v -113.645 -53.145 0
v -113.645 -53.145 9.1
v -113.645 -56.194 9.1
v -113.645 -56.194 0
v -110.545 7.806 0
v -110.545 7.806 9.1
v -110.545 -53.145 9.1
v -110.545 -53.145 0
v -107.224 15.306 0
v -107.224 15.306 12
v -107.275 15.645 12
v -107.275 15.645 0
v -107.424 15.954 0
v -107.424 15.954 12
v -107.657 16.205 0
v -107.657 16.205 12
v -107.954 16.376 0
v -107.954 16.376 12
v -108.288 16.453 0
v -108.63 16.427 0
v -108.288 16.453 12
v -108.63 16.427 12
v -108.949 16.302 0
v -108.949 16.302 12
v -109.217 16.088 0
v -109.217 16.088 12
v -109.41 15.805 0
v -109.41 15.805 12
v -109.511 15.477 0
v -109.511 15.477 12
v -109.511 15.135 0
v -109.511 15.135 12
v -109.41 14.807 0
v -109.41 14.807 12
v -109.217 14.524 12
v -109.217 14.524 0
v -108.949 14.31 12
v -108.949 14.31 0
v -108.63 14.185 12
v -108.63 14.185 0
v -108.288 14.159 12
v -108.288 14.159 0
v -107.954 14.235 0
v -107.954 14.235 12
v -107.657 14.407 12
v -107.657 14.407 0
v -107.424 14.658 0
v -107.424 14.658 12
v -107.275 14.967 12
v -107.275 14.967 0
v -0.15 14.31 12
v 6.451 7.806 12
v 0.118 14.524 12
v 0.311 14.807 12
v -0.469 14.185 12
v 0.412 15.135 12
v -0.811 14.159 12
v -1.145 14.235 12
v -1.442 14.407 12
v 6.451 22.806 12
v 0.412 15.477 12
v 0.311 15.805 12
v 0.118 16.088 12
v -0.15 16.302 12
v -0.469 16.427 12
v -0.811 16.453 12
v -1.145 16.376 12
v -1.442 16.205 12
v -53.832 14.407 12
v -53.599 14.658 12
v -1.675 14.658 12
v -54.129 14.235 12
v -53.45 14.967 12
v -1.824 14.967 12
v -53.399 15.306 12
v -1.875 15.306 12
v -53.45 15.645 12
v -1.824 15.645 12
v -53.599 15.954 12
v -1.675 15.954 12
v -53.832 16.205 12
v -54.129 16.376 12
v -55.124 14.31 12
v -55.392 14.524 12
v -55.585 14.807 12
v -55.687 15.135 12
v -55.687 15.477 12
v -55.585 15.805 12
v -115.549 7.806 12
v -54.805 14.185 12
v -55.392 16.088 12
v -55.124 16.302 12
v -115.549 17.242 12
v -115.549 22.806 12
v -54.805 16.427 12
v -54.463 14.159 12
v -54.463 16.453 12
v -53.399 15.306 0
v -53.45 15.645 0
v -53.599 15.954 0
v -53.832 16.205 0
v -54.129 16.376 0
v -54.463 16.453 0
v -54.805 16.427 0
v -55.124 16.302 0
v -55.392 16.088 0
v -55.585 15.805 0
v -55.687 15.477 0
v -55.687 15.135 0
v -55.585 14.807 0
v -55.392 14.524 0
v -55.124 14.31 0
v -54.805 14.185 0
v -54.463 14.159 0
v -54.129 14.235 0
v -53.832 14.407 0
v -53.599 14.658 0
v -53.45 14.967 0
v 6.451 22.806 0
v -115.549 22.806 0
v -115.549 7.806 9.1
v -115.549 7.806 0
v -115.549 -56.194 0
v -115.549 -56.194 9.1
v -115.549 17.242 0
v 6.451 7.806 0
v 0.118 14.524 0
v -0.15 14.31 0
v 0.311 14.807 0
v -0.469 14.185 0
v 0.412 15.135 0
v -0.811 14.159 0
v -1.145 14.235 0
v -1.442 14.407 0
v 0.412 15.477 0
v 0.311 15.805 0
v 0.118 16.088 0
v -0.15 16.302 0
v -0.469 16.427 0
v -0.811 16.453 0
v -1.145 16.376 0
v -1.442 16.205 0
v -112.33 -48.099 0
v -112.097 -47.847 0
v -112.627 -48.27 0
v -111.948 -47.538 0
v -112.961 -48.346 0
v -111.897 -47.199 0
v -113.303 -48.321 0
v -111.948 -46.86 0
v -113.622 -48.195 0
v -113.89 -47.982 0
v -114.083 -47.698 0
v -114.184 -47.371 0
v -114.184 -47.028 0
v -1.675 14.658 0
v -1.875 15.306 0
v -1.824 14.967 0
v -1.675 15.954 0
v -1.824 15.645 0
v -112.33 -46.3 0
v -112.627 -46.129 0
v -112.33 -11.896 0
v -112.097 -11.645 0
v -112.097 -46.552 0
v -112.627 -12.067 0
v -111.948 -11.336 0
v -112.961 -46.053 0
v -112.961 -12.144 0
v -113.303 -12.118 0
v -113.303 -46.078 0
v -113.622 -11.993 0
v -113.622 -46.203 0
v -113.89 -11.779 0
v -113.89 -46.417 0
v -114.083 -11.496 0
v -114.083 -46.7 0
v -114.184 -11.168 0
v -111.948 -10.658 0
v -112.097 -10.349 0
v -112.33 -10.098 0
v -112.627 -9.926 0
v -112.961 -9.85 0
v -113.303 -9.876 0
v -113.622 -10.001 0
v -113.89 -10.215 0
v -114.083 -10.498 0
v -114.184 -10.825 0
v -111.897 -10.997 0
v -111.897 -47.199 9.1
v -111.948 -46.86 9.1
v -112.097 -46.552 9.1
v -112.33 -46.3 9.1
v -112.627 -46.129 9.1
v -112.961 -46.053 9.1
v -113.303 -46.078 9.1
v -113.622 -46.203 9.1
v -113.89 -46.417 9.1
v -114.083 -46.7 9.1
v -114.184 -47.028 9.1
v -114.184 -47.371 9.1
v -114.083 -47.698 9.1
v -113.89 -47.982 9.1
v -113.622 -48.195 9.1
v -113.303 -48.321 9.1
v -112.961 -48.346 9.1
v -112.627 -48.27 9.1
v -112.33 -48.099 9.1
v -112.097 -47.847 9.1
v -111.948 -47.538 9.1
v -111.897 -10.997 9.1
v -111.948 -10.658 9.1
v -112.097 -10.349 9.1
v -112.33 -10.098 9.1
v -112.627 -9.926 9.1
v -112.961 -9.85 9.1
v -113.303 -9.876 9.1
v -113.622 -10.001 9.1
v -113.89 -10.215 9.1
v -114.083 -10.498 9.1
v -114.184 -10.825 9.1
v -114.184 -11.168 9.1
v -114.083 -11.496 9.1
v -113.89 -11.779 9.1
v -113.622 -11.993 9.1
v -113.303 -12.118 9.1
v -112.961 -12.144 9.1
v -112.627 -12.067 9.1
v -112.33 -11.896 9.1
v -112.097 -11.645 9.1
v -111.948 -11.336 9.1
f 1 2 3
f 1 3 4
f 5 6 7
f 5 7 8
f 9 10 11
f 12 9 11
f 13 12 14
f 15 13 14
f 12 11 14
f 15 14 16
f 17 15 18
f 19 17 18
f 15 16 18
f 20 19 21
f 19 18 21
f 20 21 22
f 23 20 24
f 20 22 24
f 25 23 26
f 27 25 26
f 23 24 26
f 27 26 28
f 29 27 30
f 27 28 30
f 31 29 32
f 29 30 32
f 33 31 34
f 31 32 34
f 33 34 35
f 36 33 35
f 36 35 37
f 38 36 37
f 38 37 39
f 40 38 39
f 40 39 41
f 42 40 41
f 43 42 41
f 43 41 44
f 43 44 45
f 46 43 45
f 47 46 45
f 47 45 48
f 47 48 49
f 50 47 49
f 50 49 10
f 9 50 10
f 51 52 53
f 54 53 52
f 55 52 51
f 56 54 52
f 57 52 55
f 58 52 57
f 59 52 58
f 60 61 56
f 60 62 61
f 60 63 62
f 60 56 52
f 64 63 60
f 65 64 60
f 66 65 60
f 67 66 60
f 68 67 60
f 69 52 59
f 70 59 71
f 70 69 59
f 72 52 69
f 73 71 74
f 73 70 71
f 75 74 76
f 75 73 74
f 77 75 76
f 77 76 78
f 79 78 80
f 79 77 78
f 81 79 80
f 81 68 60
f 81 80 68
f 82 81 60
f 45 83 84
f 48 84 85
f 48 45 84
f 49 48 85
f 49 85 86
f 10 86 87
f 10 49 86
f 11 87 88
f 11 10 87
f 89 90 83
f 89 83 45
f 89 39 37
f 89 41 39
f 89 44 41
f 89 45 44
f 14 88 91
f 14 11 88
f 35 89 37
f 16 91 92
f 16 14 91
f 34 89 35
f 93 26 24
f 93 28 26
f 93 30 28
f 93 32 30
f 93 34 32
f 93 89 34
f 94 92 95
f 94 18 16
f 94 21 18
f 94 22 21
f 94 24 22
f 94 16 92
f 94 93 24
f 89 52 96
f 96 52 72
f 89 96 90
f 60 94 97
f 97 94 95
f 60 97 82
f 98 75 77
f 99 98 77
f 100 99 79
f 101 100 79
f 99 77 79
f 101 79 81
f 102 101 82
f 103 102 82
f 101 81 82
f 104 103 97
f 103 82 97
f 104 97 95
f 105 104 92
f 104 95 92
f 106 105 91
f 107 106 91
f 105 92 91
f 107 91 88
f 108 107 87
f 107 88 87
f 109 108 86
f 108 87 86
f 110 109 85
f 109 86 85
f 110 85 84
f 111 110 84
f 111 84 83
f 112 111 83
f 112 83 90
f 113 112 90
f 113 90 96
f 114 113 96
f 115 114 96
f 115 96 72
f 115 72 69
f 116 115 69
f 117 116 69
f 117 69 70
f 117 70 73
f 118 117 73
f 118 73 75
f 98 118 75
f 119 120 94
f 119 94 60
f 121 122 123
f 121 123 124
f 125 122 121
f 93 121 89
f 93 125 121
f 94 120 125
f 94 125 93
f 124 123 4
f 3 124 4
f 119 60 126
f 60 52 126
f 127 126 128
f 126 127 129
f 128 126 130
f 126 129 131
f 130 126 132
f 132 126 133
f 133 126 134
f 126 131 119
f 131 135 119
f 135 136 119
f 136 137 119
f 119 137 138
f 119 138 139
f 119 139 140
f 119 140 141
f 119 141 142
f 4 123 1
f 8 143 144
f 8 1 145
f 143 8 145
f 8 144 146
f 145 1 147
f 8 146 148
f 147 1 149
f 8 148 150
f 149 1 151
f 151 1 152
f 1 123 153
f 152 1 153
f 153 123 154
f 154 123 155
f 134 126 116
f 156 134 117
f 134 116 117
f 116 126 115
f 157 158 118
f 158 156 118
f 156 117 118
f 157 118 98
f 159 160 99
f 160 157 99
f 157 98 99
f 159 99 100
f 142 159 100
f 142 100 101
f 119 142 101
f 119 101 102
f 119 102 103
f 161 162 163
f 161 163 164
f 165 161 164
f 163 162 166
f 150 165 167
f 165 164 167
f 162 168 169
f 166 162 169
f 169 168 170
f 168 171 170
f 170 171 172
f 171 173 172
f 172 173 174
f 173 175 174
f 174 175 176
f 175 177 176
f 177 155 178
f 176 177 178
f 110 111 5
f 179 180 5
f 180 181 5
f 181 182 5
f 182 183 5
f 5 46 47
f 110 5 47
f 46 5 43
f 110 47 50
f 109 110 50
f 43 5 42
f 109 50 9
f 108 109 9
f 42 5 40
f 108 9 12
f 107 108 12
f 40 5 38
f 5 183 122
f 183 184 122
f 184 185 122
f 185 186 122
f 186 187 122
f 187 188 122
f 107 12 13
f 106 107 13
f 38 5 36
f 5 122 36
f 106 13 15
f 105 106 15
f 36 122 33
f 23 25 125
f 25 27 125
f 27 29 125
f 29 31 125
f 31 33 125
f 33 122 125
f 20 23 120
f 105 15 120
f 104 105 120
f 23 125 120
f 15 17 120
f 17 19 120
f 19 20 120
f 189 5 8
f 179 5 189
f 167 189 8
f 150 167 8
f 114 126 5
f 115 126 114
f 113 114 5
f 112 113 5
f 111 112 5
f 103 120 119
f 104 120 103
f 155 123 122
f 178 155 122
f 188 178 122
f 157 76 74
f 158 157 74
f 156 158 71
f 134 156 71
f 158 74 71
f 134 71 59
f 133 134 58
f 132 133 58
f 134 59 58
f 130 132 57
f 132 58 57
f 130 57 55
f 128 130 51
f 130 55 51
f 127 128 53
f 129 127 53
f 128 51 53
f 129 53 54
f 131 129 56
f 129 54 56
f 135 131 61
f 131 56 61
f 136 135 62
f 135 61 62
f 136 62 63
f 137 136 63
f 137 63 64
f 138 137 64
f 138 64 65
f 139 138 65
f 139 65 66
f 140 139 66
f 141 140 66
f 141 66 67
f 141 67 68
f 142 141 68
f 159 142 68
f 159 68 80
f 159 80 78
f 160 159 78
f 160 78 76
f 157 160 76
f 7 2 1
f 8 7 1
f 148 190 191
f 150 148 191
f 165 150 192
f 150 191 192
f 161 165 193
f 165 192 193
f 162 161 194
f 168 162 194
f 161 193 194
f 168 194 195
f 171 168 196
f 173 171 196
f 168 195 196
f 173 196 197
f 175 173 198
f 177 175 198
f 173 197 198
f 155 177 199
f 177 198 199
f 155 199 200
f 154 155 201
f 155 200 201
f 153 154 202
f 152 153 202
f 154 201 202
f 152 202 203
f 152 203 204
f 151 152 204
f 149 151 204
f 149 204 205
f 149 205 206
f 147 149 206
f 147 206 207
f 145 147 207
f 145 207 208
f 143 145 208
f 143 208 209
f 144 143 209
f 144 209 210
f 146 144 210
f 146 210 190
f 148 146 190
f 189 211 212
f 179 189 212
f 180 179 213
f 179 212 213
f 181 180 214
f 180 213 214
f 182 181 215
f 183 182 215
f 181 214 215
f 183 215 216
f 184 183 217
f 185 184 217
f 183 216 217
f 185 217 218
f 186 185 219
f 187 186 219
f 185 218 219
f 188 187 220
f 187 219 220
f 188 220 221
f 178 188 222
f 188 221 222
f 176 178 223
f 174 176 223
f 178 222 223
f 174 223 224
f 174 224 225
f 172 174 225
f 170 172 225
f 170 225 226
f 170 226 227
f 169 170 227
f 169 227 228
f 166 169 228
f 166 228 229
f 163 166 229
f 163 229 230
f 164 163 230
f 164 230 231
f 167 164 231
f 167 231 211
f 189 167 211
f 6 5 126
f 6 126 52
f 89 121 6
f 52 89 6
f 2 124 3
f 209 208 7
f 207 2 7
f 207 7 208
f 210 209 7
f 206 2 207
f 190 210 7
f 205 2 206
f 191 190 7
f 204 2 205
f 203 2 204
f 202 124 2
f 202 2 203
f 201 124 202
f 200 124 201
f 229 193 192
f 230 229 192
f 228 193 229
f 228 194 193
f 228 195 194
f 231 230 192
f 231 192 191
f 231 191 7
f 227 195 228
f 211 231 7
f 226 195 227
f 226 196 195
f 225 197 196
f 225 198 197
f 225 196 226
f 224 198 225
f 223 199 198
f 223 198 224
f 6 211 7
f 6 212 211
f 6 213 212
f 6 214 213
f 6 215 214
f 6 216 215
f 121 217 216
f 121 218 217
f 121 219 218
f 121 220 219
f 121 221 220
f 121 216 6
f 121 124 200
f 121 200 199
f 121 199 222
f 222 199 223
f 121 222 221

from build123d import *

# Parameters (mm, degrees)
SZKIC1_W                    = 48.766356044
SZKIC1_H                    = 9.435580599
DODANIE_WYCI_GNI_CIE1_DEPTH = 10
SZKIC2_W                    = 48.766356044
SZKIC2_H                    = 9.435580599
DODANIE_WYCI_GNI_CIE2_DEPTH = 2
SZKIC5_W                    = 12
SZKIC5_H                    = 9.435580599
DODANIE_WYCI_GNI_CIE3_DEPTH = 73.233643957
SZKIC6_W                    = 122
SZKIC6_H                    = 12
DODANIE_WYCI_GNI_CIE4_DEPTH = 5.564419
SZKIC7_W                    = 3.404574644
SZKIC7_H                    = 12
DODANIE_WYCI_GNI_CIE5_DEPTH = 64
SZKIC8_W                    = 12
SZKIC8_H                    = 3.048992282
WYTNIJ_WYCI_GNI_CIE1_DEPTH  = 1.5
SZKIC9_R                    = 1.15
WYTNIJ_WYCI_GNI_CIE2_DEPTH  = 130.048184814
SZKIC10_W                   = 12
SZKIC10_H                   = 60.951007718
DODANIE_WYCI_GNI_CIE6_DEPTH = 1.6
SZKIC11_R                   = 1.15
WYTNIJ_WYCI_GNI_CIE3_DEPTH  = 130.048184814
WYTNIJ_WYCI_GNI_CIE4_REACH  = 136.855
SZKIC12_W                   = 2.9
SZKIC12_H                   = 64


with BuildPart() as part:
    # Szkic1 → Dodanie-wyciągnięcie1 (new body)
    with BuildSketch(Plane.XY):
        with Locations((-17.932561551, 12.523716149)):
            Rectangle(SZKIC1_W, SZKIC1_H)
    extrude(amount=DODANIE_WYCI_GNI_CIE1_DEPTH)

    # Szkic2 → Dodanie-wyciągnięcie2 (add)
    with BuildSketch(Plane.XY.offset(10)):
        with Locations((-17.932561551, 12.523716149)):
            Rectangle(SZKIC2_W, SZKIC2_H)
    extrude(amount=DODANIE_WYCI_GNI_CIE2_DEPTH)

    # Szkic5 → Dodanie-wyciągnięcie3 (add)
    with BuildSketch(Plane.ZY.offset(42.315739573)):
        with Locations((6, 12.523716149)):
            Rectangle(SZKIC5_W, SZKIC5_H)
    extrude(amount=DODANIE_WYCI_GNI_CIE3_DEPTH)

    # Szkic6 → Dodanie-wyciągnięcie4 (add)
    with BuildSketch(Plane(origin=(0, 17.241506448, 0), x_dir=(1, 0, 0), z_dir=(0, 1, 0))):
        with Locations((-54.549383529, -6)):
            Rectangle(SZKIC6_W, SZKIC6_H)
    extrude(amount=DODANIE_WYCI_GNI_CIE4_DEPTH)

    # Szkic7 → Dodanie-wyciągnięcie5 (add)
    with BuildSketch(Plane.XZ.offset(-7.805925849)):
        with Locations((-113.847096207, 6)):
            Rectangle(SZKIC7_W, SZKIC7_H)
    extrude(amount=DODANIE_WYCI_GNI_CIE5_DEPTH)

    # Szkic8 → Wytnij-wyciągnięcie1 (cut)
    with BuildSketch(Plane(origin=(-112.144808885, 0, 0), x_dir=(0, 0, -1), z_dir=(1, 0, 0))):
        with Locations((-6, -54.66957801)):
            Rectangle(SZKIC8_W, SZKIC8_H)
    extrude(amount=-WYTNIJ_WYCI_GNI_CIE1_DEPTH, mode=Mode.SUBTRACT)

    # Szkic9 → Wytnij-wyciągnięcie2 (cut, through all)
    with BuildSketch(Plane.XY.offset(12)):
        with Locations((-54.549383529, 15.305925849)):
            Circle(SZKIC9_R)
        with Locations((-108.373957188, 15.305925849)):
            Circle(SZKIC9_R)
        with Locations(Location((-0.724809871, 15.305925849, 0), (0, 0, 180))):
            Circle(SZKIC9_R)
    extrude(amount=-WYTNIJ_WYCI_GNI_CIE2_DEPTH, mode=Mode.SUBTRACT)

    # Szkic10 → Dodanie-wyciągnięcie6 (add)
    with BuildSketch(Plane(origin=(-112.144808885, 0, 0), x_dir=(0, 0, -1), z_dir=(1, 0, 0))):
        with Locations((-6, -22.66957801)):
            Rectangle(SZKIC10_W, SZKIC10_H)
    extrude(amount=DODANIE_WYCI_GNI_CIE6_DEPTH)

    # Szkic11 → Wytnij-wyciągnięcie3 (cut, through all)
    with BuildSketch(Plane.XY.offset(12)):
        with Locations((-113.047096207, -47.199394186)):
            Circle(SZKIC11_R)
        with Locations((-113.047096207, -10.996775314)):
            Circle(SZKIC11_R)
    extrude(amount=-WYTNIJ_WYCI_GNI_CIE3_DEPTH, mode=Mode.SUBTRACT)

    # Wytnij-wyciągnięcie4: up to this face of the body (flat: up to its plane)
    wytnij_wyci_gni_cie4_end = Plane(part.part.faces().sort_by_distance((-110.544808885, -22.66957801, 6))[0])
    # Szkic12 → Wytnij-wyciągnięcie4 (cut, up to the picked face)
    with BuildSketch(Plane.ZY.offset(115.549383529), mode=Mode.PRIVATE) as wytnij_wyci_gni_cie4_sk1:
        with Locations((10.55, -24.194074151)):
            Rectangle(SZKIC12_W, SZKIC12_H)
    wytnij_wyci_gni_cie4_tool1 = split(extrude(wytnij_wyci_gni_cie4_sk1.sketch, amount=-WYTNIJ_WYCI_GNI_CIE4_REACH, mode=Mode.PRIVATE), bisect_by=wytnij_wyci_gni_cie4_end, keep=Keep.BOTH, mode=Mode.PRIVATE)
    add(wytnij_wyci_gni_cie4_tool1.solids().sort_by(Axis((-115.549384, -24.194074, 10.55), (1, 0, 0)))[0], mode=Mode.SUBTRACT)


solid = part.part
